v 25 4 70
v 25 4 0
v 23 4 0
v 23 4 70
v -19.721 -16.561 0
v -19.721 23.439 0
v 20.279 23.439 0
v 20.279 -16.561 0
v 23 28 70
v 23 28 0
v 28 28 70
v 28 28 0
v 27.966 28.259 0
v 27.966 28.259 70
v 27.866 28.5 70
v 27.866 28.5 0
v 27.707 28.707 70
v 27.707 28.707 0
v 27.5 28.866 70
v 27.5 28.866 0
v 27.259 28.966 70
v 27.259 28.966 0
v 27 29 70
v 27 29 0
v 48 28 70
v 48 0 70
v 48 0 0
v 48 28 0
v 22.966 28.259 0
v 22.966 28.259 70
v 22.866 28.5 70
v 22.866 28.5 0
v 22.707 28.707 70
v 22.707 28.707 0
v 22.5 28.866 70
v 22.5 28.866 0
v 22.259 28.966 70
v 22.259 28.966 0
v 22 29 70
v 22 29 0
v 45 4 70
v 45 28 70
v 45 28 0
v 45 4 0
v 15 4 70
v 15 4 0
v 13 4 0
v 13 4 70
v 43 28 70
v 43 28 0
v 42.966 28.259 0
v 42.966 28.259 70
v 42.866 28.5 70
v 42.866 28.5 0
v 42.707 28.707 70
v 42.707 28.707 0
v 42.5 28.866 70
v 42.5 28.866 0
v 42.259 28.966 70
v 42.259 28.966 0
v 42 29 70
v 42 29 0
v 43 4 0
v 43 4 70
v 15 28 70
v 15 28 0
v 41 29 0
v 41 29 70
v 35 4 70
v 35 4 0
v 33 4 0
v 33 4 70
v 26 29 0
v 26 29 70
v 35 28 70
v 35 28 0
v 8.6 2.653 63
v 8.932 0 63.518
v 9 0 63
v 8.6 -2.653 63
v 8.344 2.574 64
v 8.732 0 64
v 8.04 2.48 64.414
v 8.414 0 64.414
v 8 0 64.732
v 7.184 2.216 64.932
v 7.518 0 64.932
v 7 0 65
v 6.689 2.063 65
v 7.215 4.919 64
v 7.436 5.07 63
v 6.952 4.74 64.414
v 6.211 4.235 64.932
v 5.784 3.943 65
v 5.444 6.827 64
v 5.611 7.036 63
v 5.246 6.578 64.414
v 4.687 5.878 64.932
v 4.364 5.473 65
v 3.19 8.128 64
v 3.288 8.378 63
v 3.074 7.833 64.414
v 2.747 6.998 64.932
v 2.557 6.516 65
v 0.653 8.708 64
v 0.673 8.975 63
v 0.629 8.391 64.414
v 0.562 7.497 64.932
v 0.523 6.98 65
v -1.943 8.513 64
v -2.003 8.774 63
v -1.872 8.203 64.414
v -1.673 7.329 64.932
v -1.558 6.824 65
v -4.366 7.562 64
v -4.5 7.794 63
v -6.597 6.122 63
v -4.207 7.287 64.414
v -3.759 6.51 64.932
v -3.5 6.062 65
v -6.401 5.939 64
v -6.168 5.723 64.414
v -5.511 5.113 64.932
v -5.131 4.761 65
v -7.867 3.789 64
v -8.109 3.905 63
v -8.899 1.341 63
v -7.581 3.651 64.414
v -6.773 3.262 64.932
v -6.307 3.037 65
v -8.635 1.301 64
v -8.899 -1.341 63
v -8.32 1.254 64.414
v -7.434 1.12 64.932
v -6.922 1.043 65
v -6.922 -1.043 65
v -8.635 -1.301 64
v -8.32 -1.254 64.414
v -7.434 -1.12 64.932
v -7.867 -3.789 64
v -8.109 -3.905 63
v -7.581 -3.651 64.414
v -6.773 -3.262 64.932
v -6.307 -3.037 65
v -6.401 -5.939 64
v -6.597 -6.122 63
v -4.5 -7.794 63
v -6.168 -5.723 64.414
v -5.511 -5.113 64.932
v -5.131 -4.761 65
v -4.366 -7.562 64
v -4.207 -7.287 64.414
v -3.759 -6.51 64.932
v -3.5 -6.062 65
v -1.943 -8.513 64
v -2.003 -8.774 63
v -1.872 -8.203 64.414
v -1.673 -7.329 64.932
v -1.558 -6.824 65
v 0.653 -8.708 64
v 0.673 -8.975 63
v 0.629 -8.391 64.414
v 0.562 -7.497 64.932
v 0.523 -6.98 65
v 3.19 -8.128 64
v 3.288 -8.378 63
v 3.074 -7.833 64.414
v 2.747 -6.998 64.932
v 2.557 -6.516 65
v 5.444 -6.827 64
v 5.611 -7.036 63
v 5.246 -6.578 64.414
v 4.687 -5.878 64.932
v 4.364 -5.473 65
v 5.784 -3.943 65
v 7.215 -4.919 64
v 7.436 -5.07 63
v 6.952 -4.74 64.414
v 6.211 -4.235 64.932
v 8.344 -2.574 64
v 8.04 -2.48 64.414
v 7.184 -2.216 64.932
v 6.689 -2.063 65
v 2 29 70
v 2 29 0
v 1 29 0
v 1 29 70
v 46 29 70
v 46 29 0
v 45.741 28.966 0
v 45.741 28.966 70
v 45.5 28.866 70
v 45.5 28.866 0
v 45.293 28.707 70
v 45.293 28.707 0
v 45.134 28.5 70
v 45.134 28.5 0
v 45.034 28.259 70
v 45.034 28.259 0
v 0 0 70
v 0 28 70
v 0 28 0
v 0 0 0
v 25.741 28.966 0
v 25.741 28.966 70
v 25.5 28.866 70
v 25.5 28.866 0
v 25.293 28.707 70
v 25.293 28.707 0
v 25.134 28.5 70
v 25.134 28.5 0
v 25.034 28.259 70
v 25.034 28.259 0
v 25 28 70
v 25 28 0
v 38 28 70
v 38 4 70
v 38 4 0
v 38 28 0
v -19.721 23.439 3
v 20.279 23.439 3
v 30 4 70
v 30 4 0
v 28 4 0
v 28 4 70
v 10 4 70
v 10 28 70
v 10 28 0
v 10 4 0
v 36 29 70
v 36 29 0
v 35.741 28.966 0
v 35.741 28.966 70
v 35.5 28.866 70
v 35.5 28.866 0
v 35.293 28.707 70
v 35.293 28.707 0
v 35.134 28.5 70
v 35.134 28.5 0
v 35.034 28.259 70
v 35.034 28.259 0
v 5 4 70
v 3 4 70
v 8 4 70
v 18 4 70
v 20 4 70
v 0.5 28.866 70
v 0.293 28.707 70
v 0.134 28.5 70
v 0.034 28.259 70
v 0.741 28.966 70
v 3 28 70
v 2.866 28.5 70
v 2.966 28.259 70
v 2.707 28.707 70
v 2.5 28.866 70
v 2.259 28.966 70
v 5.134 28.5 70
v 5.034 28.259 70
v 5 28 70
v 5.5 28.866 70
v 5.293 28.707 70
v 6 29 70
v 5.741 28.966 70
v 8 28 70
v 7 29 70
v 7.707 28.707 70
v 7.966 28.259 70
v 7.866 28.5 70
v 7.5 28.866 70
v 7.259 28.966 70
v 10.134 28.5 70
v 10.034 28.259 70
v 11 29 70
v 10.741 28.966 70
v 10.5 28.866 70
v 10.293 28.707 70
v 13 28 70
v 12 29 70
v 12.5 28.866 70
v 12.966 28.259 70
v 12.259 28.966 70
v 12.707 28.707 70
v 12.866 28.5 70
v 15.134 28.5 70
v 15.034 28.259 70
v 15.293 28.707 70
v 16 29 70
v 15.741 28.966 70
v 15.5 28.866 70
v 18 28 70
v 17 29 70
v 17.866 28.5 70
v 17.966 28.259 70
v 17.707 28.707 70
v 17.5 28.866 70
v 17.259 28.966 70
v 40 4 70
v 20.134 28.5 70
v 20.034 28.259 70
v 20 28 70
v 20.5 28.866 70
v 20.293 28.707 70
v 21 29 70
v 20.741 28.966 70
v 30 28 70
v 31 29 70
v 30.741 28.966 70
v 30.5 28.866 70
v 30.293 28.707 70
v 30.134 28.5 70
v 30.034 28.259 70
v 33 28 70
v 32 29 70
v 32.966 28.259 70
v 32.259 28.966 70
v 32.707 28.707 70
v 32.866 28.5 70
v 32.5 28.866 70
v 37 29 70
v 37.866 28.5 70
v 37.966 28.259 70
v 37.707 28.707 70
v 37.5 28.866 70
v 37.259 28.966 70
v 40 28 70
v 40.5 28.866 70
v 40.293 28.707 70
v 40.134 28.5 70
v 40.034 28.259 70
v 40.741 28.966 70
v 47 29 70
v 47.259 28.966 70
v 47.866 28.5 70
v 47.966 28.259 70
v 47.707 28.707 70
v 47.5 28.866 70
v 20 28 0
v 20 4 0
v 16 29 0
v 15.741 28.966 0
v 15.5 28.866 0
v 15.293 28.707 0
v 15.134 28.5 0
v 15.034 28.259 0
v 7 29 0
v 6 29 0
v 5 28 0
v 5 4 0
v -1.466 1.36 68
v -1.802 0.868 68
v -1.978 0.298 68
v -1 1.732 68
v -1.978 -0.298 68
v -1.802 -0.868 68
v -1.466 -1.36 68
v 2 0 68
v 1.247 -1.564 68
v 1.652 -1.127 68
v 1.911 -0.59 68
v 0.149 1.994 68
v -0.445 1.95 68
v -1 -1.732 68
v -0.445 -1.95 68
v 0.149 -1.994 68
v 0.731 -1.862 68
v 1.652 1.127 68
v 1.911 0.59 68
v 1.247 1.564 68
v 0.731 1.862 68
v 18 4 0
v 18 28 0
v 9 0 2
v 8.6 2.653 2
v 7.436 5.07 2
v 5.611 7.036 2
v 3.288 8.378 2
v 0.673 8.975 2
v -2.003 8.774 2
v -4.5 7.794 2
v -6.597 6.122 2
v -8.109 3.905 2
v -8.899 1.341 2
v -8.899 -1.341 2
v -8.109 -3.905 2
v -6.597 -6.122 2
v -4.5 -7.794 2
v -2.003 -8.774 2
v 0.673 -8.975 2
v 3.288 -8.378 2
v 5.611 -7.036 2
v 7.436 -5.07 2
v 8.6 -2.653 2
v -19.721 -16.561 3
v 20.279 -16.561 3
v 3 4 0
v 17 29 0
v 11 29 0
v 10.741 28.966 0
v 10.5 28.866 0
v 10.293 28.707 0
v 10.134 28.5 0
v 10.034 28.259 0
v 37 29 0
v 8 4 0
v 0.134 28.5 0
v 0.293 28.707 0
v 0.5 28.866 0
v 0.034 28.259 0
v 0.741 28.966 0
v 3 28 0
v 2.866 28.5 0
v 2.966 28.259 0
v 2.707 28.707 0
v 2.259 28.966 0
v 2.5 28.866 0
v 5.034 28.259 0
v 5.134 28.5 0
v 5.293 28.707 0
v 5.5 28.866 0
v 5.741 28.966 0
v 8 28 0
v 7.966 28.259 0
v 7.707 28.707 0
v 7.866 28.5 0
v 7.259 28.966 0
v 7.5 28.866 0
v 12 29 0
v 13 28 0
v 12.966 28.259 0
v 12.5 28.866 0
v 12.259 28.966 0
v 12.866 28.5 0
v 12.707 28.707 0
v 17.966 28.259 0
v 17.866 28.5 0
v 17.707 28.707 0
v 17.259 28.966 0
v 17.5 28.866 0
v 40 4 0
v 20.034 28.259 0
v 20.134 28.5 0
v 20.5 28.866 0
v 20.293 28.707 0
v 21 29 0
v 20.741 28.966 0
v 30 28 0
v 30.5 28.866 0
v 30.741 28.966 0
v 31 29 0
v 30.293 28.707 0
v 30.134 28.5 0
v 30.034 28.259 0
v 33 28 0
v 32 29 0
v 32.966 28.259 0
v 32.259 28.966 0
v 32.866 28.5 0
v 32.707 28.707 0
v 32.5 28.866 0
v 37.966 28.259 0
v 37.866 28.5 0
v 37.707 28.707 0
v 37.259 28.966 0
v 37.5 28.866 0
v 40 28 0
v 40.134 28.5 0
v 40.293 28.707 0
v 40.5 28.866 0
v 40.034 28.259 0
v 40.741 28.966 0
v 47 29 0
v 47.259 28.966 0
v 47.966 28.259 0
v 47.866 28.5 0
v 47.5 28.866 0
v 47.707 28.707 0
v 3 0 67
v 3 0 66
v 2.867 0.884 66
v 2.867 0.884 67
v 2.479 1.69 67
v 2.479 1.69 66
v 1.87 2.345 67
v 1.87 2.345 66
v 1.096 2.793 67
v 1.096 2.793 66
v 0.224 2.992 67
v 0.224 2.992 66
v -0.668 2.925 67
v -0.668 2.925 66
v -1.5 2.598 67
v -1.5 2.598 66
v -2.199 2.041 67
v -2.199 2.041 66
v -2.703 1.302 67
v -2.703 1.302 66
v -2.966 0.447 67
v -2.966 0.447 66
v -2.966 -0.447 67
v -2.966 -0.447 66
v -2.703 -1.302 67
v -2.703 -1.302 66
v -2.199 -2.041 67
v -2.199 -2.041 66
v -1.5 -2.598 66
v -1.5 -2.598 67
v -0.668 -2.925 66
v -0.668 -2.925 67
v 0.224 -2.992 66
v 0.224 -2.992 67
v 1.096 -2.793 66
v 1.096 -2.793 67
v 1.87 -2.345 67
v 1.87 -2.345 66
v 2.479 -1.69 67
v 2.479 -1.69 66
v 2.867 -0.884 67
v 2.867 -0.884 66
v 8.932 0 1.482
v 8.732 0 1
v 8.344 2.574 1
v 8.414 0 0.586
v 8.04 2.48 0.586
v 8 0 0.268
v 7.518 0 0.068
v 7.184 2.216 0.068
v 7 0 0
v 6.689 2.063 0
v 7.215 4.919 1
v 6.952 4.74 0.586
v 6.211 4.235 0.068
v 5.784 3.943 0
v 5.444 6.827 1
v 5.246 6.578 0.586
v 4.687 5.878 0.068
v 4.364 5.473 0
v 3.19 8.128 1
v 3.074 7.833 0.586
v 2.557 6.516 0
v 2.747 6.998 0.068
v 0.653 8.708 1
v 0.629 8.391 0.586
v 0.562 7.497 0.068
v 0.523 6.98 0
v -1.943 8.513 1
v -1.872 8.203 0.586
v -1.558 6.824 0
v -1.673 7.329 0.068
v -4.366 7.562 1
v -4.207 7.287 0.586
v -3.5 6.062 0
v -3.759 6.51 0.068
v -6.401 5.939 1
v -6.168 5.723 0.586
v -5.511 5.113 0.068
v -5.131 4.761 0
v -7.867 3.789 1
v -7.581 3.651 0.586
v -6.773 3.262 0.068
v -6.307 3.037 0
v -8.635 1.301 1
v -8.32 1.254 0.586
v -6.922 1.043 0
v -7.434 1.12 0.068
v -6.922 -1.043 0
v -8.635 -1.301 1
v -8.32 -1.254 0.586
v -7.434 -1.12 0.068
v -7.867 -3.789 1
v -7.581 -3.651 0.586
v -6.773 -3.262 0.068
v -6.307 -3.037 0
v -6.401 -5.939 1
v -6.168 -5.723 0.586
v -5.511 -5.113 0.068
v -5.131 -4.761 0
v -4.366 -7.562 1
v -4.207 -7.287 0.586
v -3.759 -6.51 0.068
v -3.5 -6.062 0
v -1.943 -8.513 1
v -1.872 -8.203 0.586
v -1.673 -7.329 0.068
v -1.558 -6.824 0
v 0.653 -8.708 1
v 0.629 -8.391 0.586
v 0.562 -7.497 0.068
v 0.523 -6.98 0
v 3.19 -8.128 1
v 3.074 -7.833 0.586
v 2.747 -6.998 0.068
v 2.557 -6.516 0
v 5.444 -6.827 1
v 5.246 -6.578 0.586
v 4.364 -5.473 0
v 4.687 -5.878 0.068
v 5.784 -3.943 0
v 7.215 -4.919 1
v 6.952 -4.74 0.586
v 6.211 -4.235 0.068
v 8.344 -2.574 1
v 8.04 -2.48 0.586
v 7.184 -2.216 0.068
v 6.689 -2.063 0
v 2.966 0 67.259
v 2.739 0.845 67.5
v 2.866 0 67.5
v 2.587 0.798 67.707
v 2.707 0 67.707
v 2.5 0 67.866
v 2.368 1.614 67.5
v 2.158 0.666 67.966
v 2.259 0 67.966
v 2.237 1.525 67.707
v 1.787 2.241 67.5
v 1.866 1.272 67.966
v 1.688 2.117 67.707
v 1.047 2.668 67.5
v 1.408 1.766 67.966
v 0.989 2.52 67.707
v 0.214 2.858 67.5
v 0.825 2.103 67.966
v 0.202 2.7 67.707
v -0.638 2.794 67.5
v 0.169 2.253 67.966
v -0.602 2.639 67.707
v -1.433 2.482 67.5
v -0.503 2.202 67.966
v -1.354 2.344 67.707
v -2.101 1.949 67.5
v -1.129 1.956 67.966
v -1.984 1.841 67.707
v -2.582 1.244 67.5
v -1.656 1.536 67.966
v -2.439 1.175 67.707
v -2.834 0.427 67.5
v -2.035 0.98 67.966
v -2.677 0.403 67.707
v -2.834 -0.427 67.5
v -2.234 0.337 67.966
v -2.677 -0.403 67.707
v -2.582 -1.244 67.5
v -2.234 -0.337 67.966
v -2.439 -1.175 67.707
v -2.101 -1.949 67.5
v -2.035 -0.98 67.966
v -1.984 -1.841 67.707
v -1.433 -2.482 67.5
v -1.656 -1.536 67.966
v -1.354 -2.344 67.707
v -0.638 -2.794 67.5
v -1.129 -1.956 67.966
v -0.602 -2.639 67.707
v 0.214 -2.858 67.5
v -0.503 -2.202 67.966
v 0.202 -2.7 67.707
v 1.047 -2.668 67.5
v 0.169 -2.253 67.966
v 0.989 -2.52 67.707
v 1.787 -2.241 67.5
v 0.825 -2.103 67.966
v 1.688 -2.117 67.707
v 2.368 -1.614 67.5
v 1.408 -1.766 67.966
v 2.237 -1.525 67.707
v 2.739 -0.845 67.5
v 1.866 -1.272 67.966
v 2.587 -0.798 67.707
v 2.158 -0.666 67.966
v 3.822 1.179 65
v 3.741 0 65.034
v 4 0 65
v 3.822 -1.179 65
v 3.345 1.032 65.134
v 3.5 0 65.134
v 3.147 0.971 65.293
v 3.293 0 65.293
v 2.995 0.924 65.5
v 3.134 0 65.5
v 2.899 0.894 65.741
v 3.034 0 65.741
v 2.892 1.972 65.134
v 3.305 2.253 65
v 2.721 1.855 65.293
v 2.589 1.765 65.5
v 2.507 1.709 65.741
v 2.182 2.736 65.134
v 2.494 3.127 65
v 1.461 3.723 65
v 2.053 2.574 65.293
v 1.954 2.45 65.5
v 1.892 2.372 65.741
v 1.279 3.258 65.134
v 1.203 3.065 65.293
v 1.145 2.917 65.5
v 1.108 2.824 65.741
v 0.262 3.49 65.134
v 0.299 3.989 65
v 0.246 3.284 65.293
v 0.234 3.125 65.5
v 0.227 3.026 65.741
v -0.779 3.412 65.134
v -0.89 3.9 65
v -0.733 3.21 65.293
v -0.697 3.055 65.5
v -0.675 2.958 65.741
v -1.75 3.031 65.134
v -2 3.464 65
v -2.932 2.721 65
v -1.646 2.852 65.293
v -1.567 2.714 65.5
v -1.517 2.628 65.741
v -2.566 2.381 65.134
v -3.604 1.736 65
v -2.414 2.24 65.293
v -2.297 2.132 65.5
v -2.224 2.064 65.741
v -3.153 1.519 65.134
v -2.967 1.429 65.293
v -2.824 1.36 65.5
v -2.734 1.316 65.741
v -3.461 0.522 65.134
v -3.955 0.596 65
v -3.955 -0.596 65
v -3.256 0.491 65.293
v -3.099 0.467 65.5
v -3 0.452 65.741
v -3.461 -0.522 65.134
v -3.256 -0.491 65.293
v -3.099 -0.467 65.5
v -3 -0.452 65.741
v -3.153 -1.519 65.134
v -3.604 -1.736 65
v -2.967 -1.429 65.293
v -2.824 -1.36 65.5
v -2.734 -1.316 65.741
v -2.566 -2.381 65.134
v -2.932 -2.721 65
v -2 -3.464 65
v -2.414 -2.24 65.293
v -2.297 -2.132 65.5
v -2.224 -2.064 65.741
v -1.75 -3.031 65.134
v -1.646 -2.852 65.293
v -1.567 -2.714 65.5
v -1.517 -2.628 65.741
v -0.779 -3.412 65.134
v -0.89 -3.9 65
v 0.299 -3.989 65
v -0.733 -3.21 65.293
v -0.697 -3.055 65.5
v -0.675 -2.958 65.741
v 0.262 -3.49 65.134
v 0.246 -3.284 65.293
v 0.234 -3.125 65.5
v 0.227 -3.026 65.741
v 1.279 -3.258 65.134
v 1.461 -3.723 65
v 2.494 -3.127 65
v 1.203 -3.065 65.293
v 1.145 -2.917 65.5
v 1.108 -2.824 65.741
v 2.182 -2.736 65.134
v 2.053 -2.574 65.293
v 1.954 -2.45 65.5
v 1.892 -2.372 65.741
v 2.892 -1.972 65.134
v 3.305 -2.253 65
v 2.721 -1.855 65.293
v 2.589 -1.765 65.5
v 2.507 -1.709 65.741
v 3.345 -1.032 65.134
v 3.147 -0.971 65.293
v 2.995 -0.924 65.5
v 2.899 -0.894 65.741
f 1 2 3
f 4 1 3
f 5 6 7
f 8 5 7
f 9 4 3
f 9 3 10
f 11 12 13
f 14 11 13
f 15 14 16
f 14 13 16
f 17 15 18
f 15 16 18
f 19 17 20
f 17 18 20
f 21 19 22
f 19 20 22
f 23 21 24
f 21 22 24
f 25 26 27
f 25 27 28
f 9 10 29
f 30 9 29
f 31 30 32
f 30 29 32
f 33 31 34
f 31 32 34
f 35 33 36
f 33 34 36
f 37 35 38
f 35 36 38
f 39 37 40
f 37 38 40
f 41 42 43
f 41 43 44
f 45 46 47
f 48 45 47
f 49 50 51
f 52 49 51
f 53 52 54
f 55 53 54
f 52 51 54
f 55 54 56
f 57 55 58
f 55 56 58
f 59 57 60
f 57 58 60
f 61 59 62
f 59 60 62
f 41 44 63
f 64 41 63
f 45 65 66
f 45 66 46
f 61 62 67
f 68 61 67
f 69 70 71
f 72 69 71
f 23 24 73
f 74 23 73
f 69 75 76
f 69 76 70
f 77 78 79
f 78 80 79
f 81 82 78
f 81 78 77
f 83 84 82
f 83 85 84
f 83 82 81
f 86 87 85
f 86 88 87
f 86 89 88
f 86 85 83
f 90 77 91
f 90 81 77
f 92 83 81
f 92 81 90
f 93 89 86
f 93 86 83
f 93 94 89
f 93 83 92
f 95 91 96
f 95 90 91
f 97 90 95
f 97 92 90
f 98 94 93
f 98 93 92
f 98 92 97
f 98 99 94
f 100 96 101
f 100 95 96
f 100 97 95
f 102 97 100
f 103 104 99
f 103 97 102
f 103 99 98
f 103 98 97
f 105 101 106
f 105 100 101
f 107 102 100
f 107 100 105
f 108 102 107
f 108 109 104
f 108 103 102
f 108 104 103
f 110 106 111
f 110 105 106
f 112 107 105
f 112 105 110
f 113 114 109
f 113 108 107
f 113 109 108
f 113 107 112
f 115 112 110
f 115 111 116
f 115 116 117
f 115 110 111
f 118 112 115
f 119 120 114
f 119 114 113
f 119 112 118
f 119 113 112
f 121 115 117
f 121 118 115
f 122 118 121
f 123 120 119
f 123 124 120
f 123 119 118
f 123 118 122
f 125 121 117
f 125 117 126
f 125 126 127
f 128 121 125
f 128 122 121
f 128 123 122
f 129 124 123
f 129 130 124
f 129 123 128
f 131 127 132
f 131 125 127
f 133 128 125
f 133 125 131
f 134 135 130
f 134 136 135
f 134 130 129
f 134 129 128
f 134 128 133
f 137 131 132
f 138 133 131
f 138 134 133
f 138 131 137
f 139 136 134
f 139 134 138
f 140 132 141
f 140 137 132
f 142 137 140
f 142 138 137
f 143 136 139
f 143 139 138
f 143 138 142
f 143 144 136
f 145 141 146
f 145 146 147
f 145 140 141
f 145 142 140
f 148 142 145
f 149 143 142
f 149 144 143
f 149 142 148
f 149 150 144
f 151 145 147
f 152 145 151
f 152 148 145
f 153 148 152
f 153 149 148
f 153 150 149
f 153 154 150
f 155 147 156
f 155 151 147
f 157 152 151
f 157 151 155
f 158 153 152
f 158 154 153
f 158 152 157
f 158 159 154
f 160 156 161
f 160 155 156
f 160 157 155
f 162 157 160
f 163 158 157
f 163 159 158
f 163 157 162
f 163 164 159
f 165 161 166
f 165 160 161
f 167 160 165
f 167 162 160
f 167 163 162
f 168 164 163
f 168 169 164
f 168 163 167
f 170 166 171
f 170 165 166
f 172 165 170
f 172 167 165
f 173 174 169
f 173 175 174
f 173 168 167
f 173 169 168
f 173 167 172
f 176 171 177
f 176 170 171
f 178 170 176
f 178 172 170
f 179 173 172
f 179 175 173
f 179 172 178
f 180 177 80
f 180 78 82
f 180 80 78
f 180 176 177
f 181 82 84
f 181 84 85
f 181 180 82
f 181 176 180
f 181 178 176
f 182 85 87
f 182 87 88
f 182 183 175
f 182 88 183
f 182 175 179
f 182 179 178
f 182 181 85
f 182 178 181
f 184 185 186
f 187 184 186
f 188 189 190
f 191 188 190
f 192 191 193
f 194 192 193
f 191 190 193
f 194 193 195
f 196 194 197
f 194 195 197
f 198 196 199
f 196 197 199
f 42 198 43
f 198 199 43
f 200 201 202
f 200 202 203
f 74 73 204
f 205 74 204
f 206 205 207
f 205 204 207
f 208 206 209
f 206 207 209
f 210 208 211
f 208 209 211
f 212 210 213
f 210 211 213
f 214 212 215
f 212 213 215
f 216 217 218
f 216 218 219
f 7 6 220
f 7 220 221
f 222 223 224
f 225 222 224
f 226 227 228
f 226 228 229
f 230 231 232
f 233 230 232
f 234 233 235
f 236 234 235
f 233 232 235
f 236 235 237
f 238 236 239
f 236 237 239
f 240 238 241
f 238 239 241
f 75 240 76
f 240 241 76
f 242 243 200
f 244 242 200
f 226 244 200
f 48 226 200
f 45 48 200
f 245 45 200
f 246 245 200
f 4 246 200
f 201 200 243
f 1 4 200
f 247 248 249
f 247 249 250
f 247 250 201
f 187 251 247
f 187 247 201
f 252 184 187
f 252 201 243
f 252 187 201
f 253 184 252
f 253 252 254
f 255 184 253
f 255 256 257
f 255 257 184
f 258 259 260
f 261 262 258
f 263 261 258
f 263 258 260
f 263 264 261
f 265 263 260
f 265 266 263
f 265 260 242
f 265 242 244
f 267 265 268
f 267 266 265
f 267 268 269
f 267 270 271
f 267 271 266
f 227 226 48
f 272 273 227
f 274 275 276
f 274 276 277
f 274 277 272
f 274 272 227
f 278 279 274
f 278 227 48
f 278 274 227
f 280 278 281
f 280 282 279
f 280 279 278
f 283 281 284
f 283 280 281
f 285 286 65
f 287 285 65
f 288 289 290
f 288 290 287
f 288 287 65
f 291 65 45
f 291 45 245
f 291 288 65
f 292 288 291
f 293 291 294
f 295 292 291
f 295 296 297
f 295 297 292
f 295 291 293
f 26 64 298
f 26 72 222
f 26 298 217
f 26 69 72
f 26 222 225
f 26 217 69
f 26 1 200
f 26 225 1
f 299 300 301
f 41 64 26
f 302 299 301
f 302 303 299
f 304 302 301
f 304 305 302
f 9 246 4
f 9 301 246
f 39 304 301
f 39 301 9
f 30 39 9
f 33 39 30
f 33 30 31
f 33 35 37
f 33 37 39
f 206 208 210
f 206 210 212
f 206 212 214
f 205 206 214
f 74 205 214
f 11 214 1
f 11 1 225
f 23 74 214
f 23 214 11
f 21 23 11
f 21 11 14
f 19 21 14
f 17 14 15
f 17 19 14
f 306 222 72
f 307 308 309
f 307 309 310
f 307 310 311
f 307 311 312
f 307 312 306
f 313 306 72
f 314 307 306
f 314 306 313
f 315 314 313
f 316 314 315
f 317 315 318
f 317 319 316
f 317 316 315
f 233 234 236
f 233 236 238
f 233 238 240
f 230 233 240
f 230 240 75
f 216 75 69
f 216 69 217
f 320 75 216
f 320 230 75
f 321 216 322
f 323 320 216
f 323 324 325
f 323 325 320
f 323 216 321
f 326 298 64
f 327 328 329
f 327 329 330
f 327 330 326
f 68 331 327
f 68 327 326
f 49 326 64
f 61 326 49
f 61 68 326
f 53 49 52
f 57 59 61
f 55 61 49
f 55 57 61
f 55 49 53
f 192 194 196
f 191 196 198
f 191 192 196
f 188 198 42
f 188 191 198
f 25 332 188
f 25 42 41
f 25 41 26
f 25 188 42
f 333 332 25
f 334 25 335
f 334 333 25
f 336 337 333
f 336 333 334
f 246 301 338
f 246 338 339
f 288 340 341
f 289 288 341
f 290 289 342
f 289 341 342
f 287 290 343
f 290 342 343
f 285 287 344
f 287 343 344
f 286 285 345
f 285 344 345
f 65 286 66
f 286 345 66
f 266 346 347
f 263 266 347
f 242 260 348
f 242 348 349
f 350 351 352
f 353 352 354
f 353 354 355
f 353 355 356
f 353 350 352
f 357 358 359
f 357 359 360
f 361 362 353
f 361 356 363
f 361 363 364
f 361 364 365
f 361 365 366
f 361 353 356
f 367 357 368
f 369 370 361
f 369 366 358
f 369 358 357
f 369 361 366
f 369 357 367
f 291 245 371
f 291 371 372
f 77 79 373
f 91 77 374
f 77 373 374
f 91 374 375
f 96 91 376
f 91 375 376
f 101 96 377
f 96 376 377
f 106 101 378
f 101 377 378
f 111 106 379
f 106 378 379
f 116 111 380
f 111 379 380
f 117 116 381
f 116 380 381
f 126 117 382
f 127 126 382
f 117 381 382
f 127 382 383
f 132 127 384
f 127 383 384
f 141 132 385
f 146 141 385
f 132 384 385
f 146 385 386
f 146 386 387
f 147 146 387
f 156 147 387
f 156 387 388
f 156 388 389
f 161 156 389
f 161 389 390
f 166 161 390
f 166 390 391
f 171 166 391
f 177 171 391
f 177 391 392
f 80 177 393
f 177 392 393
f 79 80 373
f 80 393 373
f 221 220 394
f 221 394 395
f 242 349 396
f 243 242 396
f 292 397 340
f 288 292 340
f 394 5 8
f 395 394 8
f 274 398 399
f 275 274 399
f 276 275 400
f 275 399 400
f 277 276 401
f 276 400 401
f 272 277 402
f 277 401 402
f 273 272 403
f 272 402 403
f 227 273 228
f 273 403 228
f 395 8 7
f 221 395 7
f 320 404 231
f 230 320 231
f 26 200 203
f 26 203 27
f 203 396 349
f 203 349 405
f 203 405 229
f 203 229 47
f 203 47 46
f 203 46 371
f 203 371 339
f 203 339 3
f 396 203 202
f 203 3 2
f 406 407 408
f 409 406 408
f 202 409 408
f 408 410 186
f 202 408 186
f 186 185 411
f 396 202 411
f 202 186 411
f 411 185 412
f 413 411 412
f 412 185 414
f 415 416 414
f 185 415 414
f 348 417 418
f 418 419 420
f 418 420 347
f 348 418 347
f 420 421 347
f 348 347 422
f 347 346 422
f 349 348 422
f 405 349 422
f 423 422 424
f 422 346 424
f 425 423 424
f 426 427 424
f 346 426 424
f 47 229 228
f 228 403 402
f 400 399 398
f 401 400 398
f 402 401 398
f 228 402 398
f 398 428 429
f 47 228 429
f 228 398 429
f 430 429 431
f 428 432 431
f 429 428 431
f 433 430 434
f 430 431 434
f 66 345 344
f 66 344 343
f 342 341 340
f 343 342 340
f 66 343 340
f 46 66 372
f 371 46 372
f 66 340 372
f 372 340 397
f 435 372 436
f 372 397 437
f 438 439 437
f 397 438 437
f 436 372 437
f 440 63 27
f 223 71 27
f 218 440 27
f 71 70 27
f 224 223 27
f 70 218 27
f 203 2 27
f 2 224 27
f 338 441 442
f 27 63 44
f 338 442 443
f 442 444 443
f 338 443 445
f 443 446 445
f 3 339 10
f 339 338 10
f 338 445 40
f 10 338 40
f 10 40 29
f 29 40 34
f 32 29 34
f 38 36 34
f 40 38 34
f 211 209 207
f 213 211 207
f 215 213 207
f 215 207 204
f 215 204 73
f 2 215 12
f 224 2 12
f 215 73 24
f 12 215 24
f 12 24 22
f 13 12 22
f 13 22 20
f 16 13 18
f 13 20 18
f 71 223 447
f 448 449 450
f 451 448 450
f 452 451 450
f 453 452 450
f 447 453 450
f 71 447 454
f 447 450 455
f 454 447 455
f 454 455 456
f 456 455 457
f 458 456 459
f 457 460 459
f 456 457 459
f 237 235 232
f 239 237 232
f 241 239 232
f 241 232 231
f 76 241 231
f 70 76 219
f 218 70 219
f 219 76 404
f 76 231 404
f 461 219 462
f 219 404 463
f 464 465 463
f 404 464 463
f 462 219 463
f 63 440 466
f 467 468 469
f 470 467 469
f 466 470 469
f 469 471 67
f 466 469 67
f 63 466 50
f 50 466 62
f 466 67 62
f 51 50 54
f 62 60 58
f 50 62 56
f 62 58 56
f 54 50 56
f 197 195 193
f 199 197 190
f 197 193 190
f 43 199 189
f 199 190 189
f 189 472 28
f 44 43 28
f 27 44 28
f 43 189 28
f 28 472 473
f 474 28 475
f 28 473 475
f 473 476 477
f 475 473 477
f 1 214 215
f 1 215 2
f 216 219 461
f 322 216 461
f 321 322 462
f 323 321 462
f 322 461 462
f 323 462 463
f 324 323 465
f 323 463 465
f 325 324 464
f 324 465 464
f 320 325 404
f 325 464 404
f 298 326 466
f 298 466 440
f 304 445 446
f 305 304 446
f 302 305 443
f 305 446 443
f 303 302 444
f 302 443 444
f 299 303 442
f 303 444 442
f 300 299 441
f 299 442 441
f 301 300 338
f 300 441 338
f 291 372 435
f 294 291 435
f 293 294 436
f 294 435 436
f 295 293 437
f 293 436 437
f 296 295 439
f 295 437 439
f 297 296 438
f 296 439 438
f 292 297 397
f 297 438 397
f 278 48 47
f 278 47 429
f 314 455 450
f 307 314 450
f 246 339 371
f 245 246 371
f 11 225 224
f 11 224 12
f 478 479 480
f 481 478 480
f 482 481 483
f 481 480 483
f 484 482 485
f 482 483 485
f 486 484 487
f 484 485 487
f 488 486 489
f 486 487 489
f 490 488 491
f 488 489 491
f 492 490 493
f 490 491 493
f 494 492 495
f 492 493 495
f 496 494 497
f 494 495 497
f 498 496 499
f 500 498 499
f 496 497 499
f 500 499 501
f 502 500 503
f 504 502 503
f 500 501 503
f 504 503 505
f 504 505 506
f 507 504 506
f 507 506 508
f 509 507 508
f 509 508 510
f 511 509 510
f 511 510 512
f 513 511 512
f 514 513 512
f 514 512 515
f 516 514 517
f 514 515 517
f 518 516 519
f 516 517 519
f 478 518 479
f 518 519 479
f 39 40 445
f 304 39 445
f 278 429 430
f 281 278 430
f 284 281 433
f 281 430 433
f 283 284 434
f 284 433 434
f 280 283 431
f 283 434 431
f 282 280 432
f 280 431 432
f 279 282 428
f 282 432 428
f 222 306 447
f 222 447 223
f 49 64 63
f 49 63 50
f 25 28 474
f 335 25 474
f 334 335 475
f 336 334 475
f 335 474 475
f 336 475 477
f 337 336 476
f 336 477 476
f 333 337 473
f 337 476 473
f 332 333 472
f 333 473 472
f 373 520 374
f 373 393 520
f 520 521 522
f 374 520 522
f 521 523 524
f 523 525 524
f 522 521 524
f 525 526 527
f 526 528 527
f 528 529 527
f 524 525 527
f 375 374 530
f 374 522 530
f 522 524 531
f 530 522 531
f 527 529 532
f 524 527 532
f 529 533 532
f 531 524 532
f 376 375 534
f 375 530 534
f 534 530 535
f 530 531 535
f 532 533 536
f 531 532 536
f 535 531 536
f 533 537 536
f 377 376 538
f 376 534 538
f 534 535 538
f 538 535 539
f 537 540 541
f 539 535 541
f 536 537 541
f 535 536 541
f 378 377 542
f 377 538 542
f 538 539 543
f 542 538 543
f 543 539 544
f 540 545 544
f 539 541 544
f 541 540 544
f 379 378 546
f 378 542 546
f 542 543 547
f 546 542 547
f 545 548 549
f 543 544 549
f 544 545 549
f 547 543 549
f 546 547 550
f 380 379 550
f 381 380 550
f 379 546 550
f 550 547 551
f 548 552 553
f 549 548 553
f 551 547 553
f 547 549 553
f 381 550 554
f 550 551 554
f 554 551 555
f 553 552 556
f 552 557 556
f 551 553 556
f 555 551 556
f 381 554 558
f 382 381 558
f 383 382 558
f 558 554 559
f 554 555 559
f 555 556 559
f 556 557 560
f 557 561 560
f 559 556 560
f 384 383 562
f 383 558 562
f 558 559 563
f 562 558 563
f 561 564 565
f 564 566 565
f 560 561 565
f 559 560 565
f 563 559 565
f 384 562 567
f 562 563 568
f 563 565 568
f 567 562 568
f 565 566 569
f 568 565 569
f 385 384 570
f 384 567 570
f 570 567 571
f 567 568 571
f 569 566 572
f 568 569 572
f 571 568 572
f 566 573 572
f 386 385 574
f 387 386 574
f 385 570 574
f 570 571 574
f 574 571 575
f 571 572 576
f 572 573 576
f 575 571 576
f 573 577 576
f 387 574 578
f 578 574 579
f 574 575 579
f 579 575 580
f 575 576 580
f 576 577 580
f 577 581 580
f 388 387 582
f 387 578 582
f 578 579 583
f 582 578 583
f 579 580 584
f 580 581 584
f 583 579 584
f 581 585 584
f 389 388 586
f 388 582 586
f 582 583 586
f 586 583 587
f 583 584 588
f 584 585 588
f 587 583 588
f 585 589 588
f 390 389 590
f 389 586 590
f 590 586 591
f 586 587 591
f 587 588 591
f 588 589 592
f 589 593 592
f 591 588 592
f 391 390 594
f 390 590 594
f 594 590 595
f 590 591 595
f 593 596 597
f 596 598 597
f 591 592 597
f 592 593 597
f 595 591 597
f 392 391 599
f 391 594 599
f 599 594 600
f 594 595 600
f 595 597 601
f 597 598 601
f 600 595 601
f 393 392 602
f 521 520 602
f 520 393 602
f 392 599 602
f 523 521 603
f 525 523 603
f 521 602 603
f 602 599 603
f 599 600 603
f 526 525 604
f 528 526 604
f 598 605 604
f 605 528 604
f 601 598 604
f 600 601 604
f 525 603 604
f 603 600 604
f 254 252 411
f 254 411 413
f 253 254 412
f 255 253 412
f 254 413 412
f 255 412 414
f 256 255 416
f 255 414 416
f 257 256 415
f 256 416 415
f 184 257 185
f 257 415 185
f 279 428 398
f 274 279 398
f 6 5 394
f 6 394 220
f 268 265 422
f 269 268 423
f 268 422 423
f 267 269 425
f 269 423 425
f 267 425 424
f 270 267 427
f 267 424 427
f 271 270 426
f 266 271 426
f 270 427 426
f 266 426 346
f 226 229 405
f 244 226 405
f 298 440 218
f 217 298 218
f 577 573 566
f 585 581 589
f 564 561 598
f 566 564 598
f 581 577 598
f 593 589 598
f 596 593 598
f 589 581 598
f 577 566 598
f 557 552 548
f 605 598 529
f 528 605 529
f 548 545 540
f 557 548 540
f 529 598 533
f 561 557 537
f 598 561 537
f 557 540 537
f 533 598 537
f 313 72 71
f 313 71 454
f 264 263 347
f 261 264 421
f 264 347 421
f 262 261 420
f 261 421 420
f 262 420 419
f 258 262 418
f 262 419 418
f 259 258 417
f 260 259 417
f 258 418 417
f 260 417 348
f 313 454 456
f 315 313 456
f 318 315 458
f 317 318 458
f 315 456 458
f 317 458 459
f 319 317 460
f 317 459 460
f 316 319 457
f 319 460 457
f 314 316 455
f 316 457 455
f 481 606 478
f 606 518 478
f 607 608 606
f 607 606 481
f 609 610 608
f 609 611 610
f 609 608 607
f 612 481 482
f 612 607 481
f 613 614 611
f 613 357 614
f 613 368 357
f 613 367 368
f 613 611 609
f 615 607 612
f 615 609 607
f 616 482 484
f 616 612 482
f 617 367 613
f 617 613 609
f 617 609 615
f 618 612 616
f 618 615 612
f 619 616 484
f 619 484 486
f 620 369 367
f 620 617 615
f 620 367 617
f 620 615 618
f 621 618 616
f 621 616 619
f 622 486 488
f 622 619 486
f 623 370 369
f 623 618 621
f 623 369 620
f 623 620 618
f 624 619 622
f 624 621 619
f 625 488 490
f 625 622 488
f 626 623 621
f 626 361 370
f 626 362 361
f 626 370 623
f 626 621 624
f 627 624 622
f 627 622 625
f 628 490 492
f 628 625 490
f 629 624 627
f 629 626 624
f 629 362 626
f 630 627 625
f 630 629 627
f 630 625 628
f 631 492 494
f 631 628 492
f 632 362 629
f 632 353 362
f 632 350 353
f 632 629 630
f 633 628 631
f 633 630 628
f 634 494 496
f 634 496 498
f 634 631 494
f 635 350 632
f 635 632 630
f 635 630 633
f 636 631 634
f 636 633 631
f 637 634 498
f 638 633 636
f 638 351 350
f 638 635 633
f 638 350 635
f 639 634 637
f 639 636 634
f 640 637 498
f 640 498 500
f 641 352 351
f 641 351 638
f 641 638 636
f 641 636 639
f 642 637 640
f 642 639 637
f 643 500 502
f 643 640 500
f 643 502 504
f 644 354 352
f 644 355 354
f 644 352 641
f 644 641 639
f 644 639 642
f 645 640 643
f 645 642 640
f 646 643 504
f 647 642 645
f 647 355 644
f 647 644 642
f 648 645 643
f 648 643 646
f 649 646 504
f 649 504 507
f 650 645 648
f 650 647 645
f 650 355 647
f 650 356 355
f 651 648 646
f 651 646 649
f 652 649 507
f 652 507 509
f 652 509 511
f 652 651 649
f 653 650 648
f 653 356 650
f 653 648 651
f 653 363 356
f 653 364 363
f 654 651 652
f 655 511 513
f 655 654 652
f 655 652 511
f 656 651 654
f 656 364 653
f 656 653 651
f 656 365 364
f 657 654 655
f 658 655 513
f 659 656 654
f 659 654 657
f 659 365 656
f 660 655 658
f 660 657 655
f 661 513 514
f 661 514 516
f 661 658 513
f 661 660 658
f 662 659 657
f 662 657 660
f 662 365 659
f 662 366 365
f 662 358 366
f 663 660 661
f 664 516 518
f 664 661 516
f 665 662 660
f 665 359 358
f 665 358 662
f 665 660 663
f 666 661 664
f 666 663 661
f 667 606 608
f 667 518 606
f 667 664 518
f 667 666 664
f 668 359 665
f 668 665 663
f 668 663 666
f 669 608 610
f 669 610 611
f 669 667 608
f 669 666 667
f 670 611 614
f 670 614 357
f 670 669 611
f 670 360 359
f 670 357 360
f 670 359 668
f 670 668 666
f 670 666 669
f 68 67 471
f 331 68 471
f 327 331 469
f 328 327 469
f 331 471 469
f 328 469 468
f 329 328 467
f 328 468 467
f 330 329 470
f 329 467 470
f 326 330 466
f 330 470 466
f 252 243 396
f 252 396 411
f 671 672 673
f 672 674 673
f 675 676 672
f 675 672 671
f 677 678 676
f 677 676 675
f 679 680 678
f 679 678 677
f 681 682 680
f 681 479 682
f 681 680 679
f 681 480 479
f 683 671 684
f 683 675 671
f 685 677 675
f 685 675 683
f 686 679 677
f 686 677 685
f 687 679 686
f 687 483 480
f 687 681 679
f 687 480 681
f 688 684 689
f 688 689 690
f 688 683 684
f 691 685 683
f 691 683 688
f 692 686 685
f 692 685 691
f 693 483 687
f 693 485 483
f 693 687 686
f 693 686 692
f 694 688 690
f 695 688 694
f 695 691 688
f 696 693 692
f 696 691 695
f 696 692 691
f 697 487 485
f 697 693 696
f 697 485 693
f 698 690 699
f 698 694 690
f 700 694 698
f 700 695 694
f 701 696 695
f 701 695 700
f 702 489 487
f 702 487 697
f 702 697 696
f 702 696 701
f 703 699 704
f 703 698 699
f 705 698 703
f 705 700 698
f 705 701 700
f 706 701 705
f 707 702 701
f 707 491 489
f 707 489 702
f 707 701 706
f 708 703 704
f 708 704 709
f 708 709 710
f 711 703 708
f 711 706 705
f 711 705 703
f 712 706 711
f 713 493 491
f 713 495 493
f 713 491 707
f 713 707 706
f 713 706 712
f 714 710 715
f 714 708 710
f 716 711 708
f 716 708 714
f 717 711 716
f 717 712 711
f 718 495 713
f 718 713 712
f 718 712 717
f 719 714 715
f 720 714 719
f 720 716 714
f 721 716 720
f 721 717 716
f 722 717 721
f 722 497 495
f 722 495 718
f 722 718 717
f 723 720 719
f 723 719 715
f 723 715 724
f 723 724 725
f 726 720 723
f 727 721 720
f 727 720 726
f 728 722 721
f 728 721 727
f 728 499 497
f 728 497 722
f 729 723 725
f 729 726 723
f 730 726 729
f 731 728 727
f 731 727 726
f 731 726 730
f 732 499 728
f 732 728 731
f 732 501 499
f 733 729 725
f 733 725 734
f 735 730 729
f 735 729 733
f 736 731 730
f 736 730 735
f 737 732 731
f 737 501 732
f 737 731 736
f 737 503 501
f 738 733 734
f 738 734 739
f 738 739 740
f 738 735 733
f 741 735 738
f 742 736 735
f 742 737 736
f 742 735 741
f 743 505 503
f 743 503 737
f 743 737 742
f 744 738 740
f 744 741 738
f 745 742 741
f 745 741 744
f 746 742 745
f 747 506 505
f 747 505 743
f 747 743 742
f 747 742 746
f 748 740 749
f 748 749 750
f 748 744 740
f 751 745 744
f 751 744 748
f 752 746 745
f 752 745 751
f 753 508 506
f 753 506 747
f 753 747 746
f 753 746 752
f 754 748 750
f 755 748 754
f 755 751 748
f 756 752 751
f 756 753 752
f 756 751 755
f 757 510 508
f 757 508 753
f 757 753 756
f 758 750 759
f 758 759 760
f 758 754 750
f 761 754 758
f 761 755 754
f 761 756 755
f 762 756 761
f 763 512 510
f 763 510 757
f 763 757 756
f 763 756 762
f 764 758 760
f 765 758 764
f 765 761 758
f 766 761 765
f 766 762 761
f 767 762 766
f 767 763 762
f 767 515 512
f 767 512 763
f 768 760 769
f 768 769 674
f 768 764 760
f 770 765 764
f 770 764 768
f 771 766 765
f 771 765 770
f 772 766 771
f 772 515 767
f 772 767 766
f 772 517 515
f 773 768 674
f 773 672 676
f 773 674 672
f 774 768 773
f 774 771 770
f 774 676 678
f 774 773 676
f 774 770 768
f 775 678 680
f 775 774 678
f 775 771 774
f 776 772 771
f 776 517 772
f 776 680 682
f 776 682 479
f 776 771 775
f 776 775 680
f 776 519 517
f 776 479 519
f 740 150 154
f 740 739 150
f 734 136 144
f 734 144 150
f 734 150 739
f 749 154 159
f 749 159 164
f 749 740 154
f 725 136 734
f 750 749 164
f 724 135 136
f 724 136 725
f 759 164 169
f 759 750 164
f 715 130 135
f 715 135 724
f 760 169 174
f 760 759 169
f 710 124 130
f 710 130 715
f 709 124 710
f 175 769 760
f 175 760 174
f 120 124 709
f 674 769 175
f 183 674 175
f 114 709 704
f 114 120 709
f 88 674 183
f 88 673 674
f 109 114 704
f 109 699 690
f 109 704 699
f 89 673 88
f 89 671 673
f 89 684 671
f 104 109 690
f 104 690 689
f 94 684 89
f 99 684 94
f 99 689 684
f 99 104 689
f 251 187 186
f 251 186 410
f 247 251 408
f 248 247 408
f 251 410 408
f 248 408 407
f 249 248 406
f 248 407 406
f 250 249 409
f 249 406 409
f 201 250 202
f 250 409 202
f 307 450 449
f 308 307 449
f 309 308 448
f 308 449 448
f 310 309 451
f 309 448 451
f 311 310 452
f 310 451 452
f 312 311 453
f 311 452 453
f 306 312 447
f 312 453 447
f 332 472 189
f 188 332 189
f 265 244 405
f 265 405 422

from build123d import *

# Parameters (mm, degrees)
F0_R     = 9
F1_DEPTH = 65
F2_R     = 2
F3_R     = 3
F4_DEPTH = 3
F5_R     = 1
F6_W     = 40
F6_H     = 40
F7_DEPTH = 3
F9_DEPTH = 70


with BuildPart() as f1:
    # F0 (on Top) → F1 (new body)
    with BuildSketch(Plane.XY):
        Circle(F0_R)
    extrude(amount=F1_DEPTH)

    # F2
    f2_edges = [f1.edges().sort_by_distance(p)[0] for p in [
        (-9, 0, 0),
        (-9, 0, 65),
    ]]
    fillet(f2_edges, radius=F2_R)

    # F3 (on face) → F4 (join)
    with BuildSketch(Plane.XY.offset(65)):
        Circle(F3_R)
    extrude(amount=F4_DEPTH)

    # F5
    f5_edges = [f1.edges().sort_by_distance(p)[0] for p in [
        (3, 0, 66.5),
        (-3, 0, 65),
        (-3, 0, 68),
        (-7, 0, 65),
    ]]
    fillet(f5_edges, radius=F5_R)


with BuildPart() as f7:
    # F6 (on Top) → F7 (new body)
    with BuildSketch(Plane.XY):
        with Locations((0.2787616104, 3.4393036376)):
            Rectangle(F6_W, F6_H)
    extrude(amount=F7_DEPTH)


with BuildPart() as f9:
    # F8 (on Top) → F9 (new body)
    with BuildSketch(Plane.XY):
        Polygon((0, 4), (0, 0), (48, 0), (48, 4), (45, 4), (43, 4), (40, 4), (38, 4), (35, 4), (33, 4), (30, 4), (28, 4), (25, 4), (23, 4), (20, 4), (18, 4), (15, 4), (13, 4), (10, 4), (8, 4), (5, 4), (3, 4), align=None)
        with BuildLine():
            Line((5, 28), (5, 4))
            Line((5, 4), (8, 4))
            Line((8, 4), (8, 28))
            ThreePointArc((8, 28), (7.7071067812, 28.7071067812), (7, 29))
            Line((7, 29), (6, 29))
            ThreePointArc((6, 29), (5.2928932188, 28.7071067812), (5, 28))
        make_face()
        with BuildLine():
            Line((15, 28), (15, 4))
            Line((15, 4), (18, 4))
            Line((18, 4), (18, 28))
            ThreePointArc((18, 28), (17.7071067812, 28.7071067812), (17, 29))
            Line((17, 29), (16, 29))
            ThreePointArc((16, 29), (15.2928932188, 28.7071067812), (15, 28))
        make_face()
        with BuildLine():
            Line((20, 28), (20, 4))
            Line((20, 4), (23, 4))
            Line((23, 4), (23, 28))
            ThreePointArc((23, 28), (22.7071067812, 28.7071067812), (22, 29))
            Line((22, 29), (21, 29))
            ThreePointArc((21, 29), (20.2928932188, 28.7071067812), (20, 28))
        make_face()
        with BuildLine():
            Line((25, 4), (28, 4))
            Line((28, 4), (28, 28))
            ThreePointArc((28, 28), (27.7071067812, 28.7071067812), (27, 29))
            Line((27, 29), (26, 29))
            ThreePointArc((26, 29), (25.2928932188, 28.7071067812), (25, 28))
            Line((25, 28), (25, 4))
        make_face()
        with BuildLine():
            Line((30, 4), (33, 4))
            Line((33, 4), (33, 28))
            ThreePointArc((33, 28), (32.7071067812, 28.7071067812), (32, 29))
            Line((32, 29), (31, 29))
            ThreePointArc((31, 29), (30.2928932188, 28.7071067812), (30, 28))
            Line((30, 28), (30, 4))
        make_face()
        with BuildLine():
            Line((35, 4), (38, 4))
            Line((38, 4), (38, 28))
            ThreePointArc((38, 28), (37.7071067812, 28.7071067812), (37, 29))
            Line((37, 29), (36, 29))
            ThreePointArc((36, 29), (35.2928932188, 28.7071067812), (35, 28))
            Line((35, 28), (35, 4))
        make_face()
        with BuildLine():
            Line((40, 4), (43, 4))
            Line((43, 4), (43, 28))
            ThreePointArc((43, 28), (42.7071067812, 28.7071067812), (42, 29))
            Line((42, 29), (41, 29))
            ThreePointArc((41, 29), (40.2928932188, 28.7071067812), (40, 28))
            Line((40, 28), (40, 4))
        make_face()
        with BuildLine():
            Line((45, 4), (48, 4))
            Line((48, 4), (48, 28))
            ThreePointArc((48, 28), (47.7071067812, 28.7071067812), (47, 29))
            Line((47, 29), (46, 29))
            ThreePointArc((46, 29), (45.2928932188, 28.7071067812), (45, 28))
            Line((45, 28), (45, 4))
        make_face()
        with BuildLine():
            Line((10, 28), (10, 4))
            Line((10, 4), (13, 4))
            Line((13, 4), (13, 28))
            ThreePointArc((13, 28), (12.7071067812, 28.7071067812), (12, 29))
            Line((12, 29), (11, 29))
            ThreePointArc((11, 29), (10.2928932188, 28.7071067812), (10, 28))
        make_face()
        with BuildLine():
            Line((0, 28), (0, 4))
            Line((0, 4), (3, 4))
            Line((3, 4), (3, 28))
            ThreePointArc((3, 28), (2.7071067812, 28.7071067812), (2, 29))
            Line((2, 29), (1, 29))
            ThreePointArc((1, 29), (0.2928932188, 28.7071067812), (0, 28))
        make_face()
    extrude(amount=F9_DEPTH)


solid = Compound([f1.part, f7.part, f9.part])
